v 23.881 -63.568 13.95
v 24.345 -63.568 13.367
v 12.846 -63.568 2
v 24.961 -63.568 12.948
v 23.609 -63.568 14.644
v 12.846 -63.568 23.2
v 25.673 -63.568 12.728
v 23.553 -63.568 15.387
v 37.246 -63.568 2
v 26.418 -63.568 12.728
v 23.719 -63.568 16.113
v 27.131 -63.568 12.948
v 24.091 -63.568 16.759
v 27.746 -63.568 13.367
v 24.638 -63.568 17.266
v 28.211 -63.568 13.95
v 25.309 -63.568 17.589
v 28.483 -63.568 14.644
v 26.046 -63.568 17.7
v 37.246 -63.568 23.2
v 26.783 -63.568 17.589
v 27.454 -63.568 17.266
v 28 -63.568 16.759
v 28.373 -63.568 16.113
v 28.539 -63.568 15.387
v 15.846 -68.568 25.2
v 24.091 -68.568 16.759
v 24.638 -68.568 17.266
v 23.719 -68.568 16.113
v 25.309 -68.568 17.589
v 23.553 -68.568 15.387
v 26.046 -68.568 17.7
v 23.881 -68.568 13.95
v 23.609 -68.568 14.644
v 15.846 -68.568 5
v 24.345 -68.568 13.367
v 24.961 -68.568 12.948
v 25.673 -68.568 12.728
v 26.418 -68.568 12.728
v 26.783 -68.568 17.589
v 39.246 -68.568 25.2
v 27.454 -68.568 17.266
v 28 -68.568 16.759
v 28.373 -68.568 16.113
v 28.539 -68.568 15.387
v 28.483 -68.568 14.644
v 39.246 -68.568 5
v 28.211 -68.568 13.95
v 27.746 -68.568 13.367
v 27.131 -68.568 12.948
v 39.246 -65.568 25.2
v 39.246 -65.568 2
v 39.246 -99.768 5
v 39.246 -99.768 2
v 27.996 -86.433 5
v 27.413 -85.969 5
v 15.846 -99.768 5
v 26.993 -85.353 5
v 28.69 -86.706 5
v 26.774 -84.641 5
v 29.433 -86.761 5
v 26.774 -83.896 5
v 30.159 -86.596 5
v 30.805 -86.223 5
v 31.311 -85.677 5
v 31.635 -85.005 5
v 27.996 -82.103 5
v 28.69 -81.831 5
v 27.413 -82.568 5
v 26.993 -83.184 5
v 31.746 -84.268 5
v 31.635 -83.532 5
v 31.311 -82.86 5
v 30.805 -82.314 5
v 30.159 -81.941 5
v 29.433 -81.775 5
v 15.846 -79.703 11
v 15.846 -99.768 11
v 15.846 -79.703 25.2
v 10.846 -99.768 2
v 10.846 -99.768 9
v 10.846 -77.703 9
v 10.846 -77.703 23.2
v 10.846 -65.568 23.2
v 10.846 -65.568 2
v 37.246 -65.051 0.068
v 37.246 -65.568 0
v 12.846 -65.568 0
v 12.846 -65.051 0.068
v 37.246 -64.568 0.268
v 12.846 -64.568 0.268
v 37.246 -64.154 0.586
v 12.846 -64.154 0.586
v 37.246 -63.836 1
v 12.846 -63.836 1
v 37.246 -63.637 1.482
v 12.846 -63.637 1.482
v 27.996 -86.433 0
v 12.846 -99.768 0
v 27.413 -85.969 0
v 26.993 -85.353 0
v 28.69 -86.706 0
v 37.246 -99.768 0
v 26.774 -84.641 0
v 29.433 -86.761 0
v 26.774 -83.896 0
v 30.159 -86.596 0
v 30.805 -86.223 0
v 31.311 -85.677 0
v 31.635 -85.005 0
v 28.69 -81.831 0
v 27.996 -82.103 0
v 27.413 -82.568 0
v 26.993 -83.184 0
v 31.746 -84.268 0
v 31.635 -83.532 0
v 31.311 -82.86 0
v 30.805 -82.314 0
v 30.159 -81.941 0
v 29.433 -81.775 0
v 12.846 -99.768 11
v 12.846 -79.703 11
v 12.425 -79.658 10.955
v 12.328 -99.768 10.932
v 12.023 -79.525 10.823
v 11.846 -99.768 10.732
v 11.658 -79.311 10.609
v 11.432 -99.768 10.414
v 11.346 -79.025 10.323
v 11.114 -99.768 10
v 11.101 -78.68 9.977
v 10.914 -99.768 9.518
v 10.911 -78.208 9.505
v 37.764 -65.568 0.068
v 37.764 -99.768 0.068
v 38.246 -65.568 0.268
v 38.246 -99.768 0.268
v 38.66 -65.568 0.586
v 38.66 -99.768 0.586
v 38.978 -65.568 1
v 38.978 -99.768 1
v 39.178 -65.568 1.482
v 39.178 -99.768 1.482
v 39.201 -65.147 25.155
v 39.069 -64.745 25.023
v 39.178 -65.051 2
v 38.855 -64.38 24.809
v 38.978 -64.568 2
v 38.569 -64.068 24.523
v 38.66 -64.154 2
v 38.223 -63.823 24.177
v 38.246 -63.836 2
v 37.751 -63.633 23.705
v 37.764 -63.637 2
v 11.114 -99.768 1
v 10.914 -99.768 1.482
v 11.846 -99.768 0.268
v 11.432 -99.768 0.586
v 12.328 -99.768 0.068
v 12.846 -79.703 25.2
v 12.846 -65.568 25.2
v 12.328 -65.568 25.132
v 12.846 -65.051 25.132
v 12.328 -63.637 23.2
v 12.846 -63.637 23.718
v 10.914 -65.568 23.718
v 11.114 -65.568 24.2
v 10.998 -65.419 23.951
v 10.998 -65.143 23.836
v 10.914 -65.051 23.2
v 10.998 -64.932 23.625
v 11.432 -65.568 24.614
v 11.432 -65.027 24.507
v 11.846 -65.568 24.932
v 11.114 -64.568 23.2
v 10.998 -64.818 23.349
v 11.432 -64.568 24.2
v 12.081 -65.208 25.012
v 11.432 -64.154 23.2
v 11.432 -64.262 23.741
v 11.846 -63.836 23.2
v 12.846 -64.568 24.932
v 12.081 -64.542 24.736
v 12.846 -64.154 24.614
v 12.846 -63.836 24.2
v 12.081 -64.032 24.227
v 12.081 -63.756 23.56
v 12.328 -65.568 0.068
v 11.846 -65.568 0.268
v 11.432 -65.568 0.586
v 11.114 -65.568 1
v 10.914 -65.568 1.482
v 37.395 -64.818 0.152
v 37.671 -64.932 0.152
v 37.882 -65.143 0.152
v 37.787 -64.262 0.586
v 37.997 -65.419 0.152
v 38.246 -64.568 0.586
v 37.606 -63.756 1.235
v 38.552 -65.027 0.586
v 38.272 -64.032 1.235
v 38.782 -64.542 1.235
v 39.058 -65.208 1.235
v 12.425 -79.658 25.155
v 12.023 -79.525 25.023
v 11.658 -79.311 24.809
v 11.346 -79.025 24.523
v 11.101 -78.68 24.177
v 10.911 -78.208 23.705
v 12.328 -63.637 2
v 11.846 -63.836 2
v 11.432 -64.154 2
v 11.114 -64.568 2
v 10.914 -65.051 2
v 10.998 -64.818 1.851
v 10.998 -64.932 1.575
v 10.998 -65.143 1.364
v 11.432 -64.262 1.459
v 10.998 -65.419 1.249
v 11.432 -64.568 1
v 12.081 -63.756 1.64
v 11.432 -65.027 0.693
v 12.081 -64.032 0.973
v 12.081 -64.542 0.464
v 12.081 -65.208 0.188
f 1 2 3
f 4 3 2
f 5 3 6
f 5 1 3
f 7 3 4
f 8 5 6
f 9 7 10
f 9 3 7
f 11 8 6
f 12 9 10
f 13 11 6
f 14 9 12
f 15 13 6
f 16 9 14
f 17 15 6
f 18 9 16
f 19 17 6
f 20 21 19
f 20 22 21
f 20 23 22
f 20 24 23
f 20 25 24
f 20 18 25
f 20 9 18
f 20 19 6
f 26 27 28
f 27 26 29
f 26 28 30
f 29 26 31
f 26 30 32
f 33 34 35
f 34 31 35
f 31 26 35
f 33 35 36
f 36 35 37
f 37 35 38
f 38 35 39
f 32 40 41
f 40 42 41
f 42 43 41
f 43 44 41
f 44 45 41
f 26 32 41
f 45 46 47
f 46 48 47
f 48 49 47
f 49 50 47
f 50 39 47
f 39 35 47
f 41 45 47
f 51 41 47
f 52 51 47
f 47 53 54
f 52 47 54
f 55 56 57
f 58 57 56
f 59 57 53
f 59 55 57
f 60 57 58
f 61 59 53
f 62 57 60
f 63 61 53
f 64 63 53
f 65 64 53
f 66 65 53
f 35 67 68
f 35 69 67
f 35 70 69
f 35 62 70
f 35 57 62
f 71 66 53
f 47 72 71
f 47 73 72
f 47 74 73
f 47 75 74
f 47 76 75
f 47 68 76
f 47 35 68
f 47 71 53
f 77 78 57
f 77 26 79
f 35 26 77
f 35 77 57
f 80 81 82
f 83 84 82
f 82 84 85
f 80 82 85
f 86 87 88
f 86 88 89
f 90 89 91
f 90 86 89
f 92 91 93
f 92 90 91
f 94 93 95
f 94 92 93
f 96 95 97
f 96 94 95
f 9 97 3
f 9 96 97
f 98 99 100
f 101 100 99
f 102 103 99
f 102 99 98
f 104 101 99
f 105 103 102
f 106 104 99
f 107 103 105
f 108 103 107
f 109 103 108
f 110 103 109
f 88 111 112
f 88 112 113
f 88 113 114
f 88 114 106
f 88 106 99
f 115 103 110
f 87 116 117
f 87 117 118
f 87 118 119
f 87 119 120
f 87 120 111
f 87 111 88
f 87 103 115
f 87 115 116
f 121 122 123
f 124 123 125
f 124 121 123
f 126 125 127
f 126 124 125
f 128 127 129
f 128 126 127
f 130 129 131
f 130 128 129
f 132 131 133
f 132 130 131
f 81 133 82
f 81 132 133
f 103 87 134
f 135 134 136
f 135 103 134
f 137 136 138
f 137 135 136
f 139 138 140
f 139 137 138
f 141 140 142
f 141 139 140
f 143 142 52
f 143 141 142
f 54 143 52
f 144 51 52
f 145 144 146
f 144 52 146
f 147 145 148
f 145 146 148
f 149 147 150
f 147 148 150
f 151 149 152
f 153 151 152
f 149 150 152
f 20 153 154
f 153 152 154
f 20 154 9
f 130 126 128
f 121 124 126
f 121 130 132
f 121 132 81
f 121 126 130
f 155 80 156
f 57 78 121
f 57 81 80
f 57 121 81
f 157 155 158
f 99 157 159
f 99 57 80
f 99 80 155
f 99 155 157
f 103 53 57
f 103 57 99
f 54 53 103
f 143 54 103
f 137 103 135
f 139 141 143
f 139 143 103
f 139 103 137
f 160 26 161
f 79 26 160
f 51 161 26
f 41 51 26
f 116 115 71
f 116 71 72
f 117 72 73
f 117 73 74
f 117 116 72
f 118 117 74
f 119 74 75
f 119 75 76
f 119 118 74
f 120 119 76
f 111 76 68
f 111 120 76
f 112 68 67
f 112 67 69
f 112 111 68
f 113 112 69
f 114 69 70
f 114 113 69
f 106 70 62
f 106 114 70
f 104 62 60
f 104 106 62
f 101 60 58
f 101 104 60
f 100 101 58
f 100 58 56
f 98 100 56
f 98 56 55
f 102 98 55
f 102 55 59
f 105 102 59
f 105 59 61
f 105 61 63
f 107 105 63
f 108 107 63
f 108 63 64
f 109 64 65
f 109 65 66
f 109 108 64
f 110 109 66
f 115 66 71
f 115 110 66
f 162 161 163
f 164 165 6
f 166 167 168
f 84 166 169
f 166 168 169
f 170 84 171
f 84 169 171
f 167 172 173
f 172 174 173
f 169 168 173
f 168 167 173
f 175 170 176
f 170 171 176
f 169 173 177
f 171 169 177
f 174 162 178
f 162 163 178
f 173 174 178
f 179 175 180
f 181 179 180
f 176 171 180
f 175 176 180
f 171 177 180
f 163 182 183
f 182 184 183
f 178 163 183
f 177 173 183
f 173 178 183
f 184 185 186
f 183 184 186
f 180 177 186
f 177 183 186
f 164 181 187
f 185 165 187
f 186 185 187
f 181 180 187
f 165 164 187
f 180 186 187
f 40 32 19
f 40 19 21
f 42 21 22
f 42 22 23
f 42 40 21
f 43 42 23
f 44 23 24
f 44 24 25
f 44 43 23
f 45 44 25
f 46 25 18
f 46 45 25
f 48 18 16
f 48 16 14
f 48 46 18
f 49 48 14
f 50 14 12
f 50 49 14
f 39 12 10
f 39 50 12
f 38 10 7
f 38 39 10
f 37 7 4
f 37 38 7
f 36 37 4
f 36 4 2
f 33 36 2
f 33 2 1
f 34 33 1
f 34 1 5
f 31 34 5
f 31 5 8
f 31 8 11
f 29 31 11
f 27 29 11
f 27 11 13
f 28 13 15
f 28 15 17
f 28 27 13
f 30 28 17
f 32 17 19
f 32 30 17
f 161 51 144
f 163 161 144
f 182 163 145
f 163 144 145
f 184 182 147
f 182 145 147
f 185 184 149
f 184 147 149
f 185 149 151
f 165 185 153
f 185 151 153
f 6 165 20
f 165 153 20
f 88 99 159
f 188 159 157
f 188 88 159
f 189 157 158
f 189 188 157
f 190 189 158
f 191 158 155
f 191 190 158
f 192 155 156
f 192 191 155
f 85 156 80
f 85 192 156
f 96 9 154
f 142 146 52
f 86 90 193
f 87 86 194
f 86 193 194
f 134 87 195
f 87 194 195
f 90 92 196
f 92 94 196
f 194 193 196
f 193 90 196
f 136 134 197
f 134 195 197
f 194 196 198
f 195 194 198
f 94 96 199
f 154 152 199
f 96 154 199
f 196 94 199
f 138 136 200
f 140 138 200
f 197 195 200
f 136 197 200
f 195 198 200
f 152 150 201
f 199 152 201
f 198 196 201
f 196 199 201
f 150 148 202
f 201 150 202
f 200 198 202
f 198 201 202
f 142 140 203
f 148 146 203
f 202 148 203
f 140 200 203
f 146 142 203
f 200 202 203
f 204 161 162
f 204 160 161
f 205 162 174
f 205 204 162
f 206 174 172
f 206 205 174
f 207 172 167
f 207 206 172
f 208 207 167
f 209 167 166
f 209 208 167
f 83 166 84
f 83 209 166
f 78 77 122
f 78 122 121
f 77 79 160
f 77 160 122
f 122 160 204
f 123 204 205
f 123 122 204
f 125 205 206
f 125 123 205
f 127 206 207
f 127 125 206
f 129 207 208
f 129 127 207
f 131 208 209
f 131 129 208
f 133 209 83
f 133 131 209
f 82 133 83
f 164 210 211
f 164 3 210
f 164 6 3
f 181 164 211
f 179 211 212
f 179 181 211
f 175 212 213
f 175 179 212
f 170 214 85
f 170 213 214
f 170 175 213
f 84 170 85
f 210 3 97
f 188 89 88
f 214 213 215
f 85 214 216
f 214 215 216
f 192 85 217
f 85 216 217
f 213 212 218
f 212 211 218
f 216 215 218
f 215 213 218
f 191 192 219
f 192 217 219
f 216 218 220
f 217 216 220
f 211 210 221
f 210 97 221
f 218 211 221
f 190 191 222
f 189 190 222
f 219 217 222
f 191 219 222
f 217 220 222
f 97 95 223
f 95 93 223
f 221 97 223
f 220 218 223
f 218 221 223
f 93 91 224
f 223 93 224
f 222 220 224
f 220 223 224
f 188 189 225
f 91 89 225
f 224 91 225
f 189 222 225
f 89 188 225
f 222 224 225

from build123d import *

# Parameters (mm, degrees)
ESQUISSE1_W        = 23.4
ESQUISSE1_H        = 31.2
ESQUISSE1_R        = 2.5
BOSS_EXTRU_1_DEPTH = 5
ESQUISSE3_W        = 23.4
ESQUISSE3_H        = 25.2
ESQUISSE3_R        = 2.5
BOSS_EXTRU_3_DEPTH = 5
BOSS_EXTRU_2_DEPTH = 5
CONG_1_R           = 2


with BuildPart() as part:
    # Esquisse1 → Boss.-Extru.1 (new body)
    with BuildSketch(Plane.XY):
        with Locations((27.545883061, -84.168430722)):
            Rectangle(ESQUISSE1_W, ESQUISSE1_H)
        with Locations((29.245883061, -84.268430722)):
            Circle(ESQUISSE1_R, mode=Mode.SUBTRACT)
    extrude(amount=BOSS_EXTRU_1_DEPTH)

    # Esquisse3 → Boss.-Extru.3 (add)
    with BuildSketch(Plane(origin=(0, -68.568430722, 0), x_dir=(1, 0, 0), z_dir=(0, 1, 0))):
        with Locations((27.545883061, -12.6)):
            Rectangle(ESQUISSE3_W, ESQUISSE3_H)
        with Locations(Location((26.045883061, -15.2, 0), (0, 0, 270))):
            Circle(ESQUISSE3_R, mode=Mode.SUBTRACT)
    extrude(amount=BOSS_EXTRU_3_DEPTH)

    # Esquisse2 → Boss.-Extru.2 (add)
    with BuildSketch(Plane(origin=(15.845883061, 0, 12.450490199), x_dir=(0, 0, -1), z_dir=(1, 0, 0))):
        Polygon((12.450490199, -99.768430722), (12.450490199, -63.568430722), (-12.749509801, -63.568430722), (-12.749509801, -79.702669736), (1.450490199, -79.702669736), (1.450490199, -99.768430722), align=None)
    extrude(amount=-BOSS_EXTRU_2_DEPTH)

    # Congé1
    cong_1_edges = [part.edges().sort_by_distance(p)[0] for p in [
        (25.045883061, -63.568430722, 25.2),
        (39.245883061, -63.568430722, 12.6),
        (25.045883061, -63.568430722, 0),
        (10.845883061, -89.735550229, 11),
        (10.845883061, -79.702669736, 18.1),
        (10.845883061, -71.635550229, 25.2),
        (10.845883061, -63.568430722, 12.6),
        (10.845883061, -81.668430722, 0),
        (39.245883061, -81.668430722, 0),
    ]]
    fillet(cong_1_edges, radius=CONG_1_R)


solid = part.part
